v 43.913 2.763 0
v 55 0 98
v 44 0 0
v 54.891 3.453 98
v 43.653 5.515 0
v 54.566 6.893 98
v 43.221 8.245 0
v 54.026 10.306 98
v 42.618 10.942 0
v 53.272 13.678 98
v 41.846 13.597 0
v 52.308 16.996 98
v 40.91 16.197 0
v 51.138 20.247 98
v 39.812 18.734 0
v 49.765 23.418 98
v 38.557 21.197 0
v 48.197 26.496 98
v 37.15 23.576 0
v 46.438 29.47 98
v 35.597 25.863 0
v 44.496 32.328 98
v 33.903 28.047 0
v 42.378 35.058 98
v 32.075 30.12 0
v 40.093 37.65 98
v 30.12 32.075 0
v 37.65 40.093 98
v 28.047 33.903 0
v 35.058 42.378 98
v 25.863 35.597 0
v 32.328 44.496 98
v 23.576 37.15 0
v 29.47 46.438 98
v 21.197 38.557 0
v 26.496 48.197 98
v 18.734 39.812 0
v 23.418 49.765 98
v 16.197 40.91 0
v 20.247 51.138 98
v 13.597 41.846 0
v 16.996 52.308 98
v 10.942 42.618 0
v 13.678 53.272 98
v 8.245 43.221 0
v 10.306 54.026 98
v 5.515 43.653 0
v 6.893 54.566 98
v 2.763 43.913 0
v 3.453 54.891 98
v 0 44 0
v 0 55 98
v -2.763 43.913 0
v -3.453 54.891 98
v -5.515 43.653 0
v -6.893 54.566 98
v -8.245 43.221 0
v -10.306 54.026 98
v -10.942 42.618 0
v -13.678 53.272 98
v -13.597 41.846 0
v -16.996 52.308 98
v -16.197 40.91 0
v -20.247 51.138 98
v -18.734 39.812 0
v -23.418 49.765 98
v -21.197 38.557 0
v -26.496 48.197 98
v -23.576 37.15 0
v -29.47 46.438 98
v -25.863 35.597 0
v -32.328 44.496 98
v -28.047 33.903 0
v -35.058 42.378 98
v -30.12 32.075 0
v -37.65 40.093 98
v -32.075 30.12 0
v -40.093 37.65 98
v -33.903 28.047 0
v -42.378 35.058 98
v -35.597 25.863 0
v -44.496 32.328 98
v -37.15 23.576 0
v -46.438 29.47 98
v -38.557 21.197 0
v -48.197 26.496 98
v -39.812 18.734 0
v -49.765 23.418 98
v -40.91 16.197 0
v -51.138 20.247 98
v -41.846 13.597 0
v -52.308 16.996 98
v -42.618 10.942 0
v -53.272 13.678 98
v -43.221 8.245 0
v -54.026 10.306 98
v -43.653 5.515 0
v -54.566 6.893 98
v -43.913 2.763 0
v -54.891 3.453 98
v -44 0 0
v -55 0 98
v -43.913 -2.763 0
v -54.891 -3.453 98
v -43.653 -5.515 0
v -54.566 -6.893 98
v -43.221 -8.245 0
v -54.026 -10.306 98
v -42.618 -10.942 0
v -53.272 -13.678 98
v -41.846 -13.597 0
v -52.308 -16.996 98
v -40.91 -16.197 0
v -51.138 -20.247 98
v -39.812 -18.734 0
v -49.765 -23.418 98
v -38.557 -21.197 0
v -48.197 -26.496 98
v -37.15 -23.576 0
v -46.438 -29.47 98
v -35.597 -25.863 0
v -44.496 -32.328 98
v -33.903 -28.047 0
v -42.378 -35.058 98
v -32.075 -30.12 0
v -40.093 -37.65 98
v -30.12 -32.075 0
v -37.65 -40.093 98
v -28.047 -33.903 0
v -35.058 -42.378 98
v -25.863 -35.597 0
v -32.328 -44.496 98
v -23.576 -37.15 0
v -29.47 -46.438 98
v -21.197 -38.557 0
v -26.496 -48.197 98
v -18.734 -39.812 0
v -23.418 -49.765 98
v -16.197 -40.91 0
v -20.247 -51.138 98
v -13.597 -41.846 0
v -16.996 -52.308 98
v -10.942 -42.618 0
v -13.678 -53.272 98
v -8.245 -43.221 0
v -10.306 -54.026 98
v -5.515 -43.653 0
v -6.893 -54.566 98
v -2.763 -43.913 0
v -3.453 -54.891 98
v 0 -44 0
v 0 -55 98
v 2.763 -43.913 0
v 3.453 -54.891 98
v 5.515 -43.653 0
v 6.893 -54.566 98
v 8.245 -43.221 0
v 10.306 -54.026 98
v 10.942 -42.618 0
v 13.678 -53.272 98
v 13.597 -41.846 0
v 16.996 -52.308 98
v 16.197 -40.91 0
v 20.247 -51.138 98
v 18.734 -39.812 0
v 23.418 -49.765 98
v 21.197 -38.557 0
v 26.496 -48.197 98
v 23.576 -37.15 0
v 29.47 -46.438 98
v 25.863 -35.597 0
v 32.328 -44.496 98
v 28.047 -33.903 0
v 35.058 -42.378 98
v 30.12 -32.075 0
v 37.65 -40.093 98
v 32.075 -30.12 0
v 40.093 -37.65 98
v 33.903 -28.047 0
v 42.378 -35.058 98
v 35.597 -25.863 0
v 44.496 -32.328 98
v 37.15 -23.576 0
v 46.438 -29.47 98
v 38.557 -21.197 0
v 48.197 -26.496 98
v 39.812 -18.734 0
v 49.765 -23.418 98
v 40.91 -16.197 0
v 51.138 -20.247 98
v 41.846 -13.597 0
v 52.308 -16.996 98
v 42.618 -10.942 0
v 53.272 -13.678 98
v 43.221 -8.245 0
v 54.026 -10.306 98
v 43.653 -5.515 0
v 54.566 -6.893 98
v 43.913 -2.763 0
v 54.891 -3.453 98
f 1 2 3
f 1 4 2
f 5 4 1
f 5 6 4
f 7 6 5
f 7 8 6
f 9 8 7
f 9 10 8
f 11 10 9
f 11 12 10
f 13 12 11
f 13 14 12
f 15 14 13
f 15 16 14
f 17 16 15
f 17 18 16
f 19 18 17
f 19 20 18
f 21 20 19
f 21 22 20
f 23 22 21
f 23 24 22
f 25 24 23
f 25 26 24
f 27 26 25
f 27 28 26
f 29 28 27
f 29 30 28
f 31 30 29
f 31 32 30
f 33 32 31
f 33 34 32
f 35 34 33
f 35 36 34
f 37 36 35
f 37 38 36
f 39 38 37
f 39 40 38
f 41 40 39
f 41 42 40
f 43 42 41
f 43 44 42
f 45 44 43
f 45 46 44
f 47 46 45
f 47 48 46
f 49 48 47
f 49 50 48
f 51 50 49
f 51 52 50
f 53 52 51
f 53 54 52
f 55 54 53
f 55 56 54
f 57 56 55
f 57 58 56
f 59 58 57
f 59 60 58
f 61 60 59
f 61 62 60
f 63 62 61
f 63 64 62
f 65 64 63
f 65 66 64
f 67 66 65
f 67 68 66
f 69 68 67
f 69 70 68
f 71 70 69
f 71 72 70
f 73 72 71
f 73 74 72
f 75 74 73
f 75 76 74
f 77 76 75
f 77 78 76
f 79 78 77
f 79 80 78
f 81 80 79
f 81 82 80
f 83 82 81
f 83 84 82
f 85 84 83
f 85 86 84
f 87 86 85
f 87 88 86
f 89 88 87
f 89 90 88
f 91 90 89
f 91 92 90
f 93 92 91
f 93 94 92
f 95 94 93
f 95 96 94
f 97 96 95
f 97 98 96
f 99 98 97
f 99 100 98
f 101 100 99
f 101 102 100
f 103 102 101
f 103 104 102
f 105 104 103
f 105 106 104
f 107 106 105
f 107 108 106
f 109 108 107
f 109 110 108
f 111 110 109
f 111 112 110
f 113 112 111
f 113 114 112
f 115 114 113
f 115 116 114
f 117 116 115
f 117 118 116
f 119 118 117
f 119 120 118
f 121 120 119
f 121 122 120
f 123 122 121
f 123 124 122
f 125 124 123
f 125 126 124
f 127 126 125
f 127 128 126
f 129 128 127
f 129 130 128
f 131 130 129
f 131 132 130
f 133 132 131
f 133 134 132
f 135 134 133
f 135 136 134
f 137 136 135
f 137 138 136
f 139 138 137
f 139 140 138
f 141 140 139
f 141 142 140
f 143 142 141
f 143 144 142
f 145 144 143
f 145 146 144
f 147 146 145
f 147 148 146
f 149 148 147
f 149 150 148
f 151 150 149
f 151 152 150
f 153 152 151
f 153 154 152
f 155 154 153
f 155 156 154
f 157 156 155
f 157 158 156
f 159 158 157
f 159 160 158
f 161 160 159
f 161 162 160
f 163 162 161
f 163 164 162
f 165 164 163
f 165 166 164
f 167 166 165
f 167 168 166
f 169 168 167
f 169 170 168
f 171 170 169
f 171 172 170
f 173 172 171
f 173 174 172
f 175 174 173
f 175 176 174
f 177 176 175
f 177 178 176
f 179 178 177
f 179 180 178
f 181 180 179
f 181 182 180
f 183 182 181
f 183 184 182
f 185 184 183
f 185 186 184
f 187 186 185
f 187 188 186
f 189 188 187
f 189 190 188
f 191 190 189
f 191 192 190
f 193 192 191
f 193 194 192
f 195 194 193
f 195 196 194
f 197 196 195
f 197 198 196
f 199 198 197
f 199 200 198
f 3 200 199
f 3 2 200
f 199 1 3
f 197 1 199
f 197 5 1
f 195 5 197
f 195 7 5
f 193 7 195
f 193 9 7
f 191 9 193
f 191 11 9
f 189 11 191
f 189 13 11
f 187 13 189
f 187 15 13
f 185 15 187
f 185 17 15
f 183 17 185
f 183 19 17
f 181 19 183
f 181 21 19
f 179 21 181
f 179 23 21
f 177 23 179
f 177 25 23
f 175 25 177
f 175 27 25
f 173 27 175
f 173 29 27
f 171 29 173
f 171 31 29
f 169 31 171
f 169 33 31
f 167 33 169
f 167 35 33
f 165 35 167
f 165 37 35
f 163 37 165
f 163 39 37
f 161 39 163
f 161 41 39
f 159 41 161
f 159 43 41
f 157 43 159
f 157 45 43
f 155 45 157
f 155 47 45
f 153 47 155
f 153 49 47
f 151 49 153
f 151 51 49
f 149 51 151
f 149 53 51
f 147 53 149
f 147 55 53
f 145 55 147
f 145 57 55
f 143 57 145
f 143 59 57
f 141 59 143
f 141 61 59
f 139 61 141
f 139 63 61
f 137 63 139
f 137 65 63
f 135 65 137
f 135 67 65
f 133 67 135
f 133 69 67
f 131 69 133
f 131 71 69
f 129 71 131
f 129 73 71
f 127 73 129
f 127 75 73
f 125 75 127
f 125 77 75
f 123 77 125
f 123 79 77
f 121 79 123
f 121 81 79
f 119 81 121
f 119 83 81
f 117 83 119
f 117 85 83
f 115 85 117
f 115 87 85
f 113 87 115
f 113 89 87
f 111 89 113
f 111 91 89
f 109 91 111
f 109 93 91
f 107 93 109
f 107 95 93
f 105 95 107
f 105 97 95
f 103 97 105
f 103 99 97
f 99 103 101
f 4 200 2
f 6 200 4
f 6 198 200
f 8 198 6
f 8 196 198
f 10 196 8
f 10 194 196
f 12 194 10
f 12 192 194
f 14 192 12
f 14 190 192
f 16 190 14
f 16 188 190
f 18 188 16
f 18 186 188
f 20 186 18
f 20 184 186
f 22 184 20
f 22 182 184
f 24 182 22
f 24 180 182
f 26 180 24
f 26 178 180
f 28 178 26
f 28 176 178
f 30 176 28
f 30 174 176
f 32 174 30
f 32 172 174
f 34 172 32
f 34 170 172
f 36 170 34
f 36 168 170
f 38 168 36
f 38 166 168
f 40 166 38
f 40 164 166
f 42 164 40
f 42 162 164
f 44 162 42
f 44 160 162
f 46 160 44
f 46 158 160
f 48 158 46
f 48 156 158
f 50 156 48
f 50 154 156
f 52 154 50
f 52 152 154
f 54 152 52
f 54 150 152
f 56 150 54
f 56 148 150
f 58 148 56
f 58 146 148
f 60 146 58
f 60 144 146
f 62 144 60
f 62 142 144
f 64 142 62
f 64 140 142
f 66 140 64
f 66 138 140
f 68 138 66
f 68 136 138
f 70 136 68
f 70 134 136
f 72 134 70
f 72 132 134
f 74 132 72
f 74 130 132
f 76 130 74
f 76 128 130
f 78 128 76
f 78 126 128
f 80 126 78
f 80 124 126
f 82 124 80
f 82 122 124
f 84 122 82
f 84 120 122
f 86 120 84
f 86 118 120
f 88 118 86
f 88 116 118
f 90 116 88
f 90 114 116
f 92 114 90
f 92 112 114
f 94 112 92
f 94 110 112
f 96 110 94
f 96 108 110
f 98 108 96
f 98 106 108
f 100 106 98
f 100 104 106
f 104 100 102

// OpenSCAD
// Big steel pot
// db = 95;
// dt = 129;
// h = 114;
// Small steel pot
db = 88;
dt = 110;
h = 98;

cylinder(d2=dt,d1=db,h=h,$fn=100);
